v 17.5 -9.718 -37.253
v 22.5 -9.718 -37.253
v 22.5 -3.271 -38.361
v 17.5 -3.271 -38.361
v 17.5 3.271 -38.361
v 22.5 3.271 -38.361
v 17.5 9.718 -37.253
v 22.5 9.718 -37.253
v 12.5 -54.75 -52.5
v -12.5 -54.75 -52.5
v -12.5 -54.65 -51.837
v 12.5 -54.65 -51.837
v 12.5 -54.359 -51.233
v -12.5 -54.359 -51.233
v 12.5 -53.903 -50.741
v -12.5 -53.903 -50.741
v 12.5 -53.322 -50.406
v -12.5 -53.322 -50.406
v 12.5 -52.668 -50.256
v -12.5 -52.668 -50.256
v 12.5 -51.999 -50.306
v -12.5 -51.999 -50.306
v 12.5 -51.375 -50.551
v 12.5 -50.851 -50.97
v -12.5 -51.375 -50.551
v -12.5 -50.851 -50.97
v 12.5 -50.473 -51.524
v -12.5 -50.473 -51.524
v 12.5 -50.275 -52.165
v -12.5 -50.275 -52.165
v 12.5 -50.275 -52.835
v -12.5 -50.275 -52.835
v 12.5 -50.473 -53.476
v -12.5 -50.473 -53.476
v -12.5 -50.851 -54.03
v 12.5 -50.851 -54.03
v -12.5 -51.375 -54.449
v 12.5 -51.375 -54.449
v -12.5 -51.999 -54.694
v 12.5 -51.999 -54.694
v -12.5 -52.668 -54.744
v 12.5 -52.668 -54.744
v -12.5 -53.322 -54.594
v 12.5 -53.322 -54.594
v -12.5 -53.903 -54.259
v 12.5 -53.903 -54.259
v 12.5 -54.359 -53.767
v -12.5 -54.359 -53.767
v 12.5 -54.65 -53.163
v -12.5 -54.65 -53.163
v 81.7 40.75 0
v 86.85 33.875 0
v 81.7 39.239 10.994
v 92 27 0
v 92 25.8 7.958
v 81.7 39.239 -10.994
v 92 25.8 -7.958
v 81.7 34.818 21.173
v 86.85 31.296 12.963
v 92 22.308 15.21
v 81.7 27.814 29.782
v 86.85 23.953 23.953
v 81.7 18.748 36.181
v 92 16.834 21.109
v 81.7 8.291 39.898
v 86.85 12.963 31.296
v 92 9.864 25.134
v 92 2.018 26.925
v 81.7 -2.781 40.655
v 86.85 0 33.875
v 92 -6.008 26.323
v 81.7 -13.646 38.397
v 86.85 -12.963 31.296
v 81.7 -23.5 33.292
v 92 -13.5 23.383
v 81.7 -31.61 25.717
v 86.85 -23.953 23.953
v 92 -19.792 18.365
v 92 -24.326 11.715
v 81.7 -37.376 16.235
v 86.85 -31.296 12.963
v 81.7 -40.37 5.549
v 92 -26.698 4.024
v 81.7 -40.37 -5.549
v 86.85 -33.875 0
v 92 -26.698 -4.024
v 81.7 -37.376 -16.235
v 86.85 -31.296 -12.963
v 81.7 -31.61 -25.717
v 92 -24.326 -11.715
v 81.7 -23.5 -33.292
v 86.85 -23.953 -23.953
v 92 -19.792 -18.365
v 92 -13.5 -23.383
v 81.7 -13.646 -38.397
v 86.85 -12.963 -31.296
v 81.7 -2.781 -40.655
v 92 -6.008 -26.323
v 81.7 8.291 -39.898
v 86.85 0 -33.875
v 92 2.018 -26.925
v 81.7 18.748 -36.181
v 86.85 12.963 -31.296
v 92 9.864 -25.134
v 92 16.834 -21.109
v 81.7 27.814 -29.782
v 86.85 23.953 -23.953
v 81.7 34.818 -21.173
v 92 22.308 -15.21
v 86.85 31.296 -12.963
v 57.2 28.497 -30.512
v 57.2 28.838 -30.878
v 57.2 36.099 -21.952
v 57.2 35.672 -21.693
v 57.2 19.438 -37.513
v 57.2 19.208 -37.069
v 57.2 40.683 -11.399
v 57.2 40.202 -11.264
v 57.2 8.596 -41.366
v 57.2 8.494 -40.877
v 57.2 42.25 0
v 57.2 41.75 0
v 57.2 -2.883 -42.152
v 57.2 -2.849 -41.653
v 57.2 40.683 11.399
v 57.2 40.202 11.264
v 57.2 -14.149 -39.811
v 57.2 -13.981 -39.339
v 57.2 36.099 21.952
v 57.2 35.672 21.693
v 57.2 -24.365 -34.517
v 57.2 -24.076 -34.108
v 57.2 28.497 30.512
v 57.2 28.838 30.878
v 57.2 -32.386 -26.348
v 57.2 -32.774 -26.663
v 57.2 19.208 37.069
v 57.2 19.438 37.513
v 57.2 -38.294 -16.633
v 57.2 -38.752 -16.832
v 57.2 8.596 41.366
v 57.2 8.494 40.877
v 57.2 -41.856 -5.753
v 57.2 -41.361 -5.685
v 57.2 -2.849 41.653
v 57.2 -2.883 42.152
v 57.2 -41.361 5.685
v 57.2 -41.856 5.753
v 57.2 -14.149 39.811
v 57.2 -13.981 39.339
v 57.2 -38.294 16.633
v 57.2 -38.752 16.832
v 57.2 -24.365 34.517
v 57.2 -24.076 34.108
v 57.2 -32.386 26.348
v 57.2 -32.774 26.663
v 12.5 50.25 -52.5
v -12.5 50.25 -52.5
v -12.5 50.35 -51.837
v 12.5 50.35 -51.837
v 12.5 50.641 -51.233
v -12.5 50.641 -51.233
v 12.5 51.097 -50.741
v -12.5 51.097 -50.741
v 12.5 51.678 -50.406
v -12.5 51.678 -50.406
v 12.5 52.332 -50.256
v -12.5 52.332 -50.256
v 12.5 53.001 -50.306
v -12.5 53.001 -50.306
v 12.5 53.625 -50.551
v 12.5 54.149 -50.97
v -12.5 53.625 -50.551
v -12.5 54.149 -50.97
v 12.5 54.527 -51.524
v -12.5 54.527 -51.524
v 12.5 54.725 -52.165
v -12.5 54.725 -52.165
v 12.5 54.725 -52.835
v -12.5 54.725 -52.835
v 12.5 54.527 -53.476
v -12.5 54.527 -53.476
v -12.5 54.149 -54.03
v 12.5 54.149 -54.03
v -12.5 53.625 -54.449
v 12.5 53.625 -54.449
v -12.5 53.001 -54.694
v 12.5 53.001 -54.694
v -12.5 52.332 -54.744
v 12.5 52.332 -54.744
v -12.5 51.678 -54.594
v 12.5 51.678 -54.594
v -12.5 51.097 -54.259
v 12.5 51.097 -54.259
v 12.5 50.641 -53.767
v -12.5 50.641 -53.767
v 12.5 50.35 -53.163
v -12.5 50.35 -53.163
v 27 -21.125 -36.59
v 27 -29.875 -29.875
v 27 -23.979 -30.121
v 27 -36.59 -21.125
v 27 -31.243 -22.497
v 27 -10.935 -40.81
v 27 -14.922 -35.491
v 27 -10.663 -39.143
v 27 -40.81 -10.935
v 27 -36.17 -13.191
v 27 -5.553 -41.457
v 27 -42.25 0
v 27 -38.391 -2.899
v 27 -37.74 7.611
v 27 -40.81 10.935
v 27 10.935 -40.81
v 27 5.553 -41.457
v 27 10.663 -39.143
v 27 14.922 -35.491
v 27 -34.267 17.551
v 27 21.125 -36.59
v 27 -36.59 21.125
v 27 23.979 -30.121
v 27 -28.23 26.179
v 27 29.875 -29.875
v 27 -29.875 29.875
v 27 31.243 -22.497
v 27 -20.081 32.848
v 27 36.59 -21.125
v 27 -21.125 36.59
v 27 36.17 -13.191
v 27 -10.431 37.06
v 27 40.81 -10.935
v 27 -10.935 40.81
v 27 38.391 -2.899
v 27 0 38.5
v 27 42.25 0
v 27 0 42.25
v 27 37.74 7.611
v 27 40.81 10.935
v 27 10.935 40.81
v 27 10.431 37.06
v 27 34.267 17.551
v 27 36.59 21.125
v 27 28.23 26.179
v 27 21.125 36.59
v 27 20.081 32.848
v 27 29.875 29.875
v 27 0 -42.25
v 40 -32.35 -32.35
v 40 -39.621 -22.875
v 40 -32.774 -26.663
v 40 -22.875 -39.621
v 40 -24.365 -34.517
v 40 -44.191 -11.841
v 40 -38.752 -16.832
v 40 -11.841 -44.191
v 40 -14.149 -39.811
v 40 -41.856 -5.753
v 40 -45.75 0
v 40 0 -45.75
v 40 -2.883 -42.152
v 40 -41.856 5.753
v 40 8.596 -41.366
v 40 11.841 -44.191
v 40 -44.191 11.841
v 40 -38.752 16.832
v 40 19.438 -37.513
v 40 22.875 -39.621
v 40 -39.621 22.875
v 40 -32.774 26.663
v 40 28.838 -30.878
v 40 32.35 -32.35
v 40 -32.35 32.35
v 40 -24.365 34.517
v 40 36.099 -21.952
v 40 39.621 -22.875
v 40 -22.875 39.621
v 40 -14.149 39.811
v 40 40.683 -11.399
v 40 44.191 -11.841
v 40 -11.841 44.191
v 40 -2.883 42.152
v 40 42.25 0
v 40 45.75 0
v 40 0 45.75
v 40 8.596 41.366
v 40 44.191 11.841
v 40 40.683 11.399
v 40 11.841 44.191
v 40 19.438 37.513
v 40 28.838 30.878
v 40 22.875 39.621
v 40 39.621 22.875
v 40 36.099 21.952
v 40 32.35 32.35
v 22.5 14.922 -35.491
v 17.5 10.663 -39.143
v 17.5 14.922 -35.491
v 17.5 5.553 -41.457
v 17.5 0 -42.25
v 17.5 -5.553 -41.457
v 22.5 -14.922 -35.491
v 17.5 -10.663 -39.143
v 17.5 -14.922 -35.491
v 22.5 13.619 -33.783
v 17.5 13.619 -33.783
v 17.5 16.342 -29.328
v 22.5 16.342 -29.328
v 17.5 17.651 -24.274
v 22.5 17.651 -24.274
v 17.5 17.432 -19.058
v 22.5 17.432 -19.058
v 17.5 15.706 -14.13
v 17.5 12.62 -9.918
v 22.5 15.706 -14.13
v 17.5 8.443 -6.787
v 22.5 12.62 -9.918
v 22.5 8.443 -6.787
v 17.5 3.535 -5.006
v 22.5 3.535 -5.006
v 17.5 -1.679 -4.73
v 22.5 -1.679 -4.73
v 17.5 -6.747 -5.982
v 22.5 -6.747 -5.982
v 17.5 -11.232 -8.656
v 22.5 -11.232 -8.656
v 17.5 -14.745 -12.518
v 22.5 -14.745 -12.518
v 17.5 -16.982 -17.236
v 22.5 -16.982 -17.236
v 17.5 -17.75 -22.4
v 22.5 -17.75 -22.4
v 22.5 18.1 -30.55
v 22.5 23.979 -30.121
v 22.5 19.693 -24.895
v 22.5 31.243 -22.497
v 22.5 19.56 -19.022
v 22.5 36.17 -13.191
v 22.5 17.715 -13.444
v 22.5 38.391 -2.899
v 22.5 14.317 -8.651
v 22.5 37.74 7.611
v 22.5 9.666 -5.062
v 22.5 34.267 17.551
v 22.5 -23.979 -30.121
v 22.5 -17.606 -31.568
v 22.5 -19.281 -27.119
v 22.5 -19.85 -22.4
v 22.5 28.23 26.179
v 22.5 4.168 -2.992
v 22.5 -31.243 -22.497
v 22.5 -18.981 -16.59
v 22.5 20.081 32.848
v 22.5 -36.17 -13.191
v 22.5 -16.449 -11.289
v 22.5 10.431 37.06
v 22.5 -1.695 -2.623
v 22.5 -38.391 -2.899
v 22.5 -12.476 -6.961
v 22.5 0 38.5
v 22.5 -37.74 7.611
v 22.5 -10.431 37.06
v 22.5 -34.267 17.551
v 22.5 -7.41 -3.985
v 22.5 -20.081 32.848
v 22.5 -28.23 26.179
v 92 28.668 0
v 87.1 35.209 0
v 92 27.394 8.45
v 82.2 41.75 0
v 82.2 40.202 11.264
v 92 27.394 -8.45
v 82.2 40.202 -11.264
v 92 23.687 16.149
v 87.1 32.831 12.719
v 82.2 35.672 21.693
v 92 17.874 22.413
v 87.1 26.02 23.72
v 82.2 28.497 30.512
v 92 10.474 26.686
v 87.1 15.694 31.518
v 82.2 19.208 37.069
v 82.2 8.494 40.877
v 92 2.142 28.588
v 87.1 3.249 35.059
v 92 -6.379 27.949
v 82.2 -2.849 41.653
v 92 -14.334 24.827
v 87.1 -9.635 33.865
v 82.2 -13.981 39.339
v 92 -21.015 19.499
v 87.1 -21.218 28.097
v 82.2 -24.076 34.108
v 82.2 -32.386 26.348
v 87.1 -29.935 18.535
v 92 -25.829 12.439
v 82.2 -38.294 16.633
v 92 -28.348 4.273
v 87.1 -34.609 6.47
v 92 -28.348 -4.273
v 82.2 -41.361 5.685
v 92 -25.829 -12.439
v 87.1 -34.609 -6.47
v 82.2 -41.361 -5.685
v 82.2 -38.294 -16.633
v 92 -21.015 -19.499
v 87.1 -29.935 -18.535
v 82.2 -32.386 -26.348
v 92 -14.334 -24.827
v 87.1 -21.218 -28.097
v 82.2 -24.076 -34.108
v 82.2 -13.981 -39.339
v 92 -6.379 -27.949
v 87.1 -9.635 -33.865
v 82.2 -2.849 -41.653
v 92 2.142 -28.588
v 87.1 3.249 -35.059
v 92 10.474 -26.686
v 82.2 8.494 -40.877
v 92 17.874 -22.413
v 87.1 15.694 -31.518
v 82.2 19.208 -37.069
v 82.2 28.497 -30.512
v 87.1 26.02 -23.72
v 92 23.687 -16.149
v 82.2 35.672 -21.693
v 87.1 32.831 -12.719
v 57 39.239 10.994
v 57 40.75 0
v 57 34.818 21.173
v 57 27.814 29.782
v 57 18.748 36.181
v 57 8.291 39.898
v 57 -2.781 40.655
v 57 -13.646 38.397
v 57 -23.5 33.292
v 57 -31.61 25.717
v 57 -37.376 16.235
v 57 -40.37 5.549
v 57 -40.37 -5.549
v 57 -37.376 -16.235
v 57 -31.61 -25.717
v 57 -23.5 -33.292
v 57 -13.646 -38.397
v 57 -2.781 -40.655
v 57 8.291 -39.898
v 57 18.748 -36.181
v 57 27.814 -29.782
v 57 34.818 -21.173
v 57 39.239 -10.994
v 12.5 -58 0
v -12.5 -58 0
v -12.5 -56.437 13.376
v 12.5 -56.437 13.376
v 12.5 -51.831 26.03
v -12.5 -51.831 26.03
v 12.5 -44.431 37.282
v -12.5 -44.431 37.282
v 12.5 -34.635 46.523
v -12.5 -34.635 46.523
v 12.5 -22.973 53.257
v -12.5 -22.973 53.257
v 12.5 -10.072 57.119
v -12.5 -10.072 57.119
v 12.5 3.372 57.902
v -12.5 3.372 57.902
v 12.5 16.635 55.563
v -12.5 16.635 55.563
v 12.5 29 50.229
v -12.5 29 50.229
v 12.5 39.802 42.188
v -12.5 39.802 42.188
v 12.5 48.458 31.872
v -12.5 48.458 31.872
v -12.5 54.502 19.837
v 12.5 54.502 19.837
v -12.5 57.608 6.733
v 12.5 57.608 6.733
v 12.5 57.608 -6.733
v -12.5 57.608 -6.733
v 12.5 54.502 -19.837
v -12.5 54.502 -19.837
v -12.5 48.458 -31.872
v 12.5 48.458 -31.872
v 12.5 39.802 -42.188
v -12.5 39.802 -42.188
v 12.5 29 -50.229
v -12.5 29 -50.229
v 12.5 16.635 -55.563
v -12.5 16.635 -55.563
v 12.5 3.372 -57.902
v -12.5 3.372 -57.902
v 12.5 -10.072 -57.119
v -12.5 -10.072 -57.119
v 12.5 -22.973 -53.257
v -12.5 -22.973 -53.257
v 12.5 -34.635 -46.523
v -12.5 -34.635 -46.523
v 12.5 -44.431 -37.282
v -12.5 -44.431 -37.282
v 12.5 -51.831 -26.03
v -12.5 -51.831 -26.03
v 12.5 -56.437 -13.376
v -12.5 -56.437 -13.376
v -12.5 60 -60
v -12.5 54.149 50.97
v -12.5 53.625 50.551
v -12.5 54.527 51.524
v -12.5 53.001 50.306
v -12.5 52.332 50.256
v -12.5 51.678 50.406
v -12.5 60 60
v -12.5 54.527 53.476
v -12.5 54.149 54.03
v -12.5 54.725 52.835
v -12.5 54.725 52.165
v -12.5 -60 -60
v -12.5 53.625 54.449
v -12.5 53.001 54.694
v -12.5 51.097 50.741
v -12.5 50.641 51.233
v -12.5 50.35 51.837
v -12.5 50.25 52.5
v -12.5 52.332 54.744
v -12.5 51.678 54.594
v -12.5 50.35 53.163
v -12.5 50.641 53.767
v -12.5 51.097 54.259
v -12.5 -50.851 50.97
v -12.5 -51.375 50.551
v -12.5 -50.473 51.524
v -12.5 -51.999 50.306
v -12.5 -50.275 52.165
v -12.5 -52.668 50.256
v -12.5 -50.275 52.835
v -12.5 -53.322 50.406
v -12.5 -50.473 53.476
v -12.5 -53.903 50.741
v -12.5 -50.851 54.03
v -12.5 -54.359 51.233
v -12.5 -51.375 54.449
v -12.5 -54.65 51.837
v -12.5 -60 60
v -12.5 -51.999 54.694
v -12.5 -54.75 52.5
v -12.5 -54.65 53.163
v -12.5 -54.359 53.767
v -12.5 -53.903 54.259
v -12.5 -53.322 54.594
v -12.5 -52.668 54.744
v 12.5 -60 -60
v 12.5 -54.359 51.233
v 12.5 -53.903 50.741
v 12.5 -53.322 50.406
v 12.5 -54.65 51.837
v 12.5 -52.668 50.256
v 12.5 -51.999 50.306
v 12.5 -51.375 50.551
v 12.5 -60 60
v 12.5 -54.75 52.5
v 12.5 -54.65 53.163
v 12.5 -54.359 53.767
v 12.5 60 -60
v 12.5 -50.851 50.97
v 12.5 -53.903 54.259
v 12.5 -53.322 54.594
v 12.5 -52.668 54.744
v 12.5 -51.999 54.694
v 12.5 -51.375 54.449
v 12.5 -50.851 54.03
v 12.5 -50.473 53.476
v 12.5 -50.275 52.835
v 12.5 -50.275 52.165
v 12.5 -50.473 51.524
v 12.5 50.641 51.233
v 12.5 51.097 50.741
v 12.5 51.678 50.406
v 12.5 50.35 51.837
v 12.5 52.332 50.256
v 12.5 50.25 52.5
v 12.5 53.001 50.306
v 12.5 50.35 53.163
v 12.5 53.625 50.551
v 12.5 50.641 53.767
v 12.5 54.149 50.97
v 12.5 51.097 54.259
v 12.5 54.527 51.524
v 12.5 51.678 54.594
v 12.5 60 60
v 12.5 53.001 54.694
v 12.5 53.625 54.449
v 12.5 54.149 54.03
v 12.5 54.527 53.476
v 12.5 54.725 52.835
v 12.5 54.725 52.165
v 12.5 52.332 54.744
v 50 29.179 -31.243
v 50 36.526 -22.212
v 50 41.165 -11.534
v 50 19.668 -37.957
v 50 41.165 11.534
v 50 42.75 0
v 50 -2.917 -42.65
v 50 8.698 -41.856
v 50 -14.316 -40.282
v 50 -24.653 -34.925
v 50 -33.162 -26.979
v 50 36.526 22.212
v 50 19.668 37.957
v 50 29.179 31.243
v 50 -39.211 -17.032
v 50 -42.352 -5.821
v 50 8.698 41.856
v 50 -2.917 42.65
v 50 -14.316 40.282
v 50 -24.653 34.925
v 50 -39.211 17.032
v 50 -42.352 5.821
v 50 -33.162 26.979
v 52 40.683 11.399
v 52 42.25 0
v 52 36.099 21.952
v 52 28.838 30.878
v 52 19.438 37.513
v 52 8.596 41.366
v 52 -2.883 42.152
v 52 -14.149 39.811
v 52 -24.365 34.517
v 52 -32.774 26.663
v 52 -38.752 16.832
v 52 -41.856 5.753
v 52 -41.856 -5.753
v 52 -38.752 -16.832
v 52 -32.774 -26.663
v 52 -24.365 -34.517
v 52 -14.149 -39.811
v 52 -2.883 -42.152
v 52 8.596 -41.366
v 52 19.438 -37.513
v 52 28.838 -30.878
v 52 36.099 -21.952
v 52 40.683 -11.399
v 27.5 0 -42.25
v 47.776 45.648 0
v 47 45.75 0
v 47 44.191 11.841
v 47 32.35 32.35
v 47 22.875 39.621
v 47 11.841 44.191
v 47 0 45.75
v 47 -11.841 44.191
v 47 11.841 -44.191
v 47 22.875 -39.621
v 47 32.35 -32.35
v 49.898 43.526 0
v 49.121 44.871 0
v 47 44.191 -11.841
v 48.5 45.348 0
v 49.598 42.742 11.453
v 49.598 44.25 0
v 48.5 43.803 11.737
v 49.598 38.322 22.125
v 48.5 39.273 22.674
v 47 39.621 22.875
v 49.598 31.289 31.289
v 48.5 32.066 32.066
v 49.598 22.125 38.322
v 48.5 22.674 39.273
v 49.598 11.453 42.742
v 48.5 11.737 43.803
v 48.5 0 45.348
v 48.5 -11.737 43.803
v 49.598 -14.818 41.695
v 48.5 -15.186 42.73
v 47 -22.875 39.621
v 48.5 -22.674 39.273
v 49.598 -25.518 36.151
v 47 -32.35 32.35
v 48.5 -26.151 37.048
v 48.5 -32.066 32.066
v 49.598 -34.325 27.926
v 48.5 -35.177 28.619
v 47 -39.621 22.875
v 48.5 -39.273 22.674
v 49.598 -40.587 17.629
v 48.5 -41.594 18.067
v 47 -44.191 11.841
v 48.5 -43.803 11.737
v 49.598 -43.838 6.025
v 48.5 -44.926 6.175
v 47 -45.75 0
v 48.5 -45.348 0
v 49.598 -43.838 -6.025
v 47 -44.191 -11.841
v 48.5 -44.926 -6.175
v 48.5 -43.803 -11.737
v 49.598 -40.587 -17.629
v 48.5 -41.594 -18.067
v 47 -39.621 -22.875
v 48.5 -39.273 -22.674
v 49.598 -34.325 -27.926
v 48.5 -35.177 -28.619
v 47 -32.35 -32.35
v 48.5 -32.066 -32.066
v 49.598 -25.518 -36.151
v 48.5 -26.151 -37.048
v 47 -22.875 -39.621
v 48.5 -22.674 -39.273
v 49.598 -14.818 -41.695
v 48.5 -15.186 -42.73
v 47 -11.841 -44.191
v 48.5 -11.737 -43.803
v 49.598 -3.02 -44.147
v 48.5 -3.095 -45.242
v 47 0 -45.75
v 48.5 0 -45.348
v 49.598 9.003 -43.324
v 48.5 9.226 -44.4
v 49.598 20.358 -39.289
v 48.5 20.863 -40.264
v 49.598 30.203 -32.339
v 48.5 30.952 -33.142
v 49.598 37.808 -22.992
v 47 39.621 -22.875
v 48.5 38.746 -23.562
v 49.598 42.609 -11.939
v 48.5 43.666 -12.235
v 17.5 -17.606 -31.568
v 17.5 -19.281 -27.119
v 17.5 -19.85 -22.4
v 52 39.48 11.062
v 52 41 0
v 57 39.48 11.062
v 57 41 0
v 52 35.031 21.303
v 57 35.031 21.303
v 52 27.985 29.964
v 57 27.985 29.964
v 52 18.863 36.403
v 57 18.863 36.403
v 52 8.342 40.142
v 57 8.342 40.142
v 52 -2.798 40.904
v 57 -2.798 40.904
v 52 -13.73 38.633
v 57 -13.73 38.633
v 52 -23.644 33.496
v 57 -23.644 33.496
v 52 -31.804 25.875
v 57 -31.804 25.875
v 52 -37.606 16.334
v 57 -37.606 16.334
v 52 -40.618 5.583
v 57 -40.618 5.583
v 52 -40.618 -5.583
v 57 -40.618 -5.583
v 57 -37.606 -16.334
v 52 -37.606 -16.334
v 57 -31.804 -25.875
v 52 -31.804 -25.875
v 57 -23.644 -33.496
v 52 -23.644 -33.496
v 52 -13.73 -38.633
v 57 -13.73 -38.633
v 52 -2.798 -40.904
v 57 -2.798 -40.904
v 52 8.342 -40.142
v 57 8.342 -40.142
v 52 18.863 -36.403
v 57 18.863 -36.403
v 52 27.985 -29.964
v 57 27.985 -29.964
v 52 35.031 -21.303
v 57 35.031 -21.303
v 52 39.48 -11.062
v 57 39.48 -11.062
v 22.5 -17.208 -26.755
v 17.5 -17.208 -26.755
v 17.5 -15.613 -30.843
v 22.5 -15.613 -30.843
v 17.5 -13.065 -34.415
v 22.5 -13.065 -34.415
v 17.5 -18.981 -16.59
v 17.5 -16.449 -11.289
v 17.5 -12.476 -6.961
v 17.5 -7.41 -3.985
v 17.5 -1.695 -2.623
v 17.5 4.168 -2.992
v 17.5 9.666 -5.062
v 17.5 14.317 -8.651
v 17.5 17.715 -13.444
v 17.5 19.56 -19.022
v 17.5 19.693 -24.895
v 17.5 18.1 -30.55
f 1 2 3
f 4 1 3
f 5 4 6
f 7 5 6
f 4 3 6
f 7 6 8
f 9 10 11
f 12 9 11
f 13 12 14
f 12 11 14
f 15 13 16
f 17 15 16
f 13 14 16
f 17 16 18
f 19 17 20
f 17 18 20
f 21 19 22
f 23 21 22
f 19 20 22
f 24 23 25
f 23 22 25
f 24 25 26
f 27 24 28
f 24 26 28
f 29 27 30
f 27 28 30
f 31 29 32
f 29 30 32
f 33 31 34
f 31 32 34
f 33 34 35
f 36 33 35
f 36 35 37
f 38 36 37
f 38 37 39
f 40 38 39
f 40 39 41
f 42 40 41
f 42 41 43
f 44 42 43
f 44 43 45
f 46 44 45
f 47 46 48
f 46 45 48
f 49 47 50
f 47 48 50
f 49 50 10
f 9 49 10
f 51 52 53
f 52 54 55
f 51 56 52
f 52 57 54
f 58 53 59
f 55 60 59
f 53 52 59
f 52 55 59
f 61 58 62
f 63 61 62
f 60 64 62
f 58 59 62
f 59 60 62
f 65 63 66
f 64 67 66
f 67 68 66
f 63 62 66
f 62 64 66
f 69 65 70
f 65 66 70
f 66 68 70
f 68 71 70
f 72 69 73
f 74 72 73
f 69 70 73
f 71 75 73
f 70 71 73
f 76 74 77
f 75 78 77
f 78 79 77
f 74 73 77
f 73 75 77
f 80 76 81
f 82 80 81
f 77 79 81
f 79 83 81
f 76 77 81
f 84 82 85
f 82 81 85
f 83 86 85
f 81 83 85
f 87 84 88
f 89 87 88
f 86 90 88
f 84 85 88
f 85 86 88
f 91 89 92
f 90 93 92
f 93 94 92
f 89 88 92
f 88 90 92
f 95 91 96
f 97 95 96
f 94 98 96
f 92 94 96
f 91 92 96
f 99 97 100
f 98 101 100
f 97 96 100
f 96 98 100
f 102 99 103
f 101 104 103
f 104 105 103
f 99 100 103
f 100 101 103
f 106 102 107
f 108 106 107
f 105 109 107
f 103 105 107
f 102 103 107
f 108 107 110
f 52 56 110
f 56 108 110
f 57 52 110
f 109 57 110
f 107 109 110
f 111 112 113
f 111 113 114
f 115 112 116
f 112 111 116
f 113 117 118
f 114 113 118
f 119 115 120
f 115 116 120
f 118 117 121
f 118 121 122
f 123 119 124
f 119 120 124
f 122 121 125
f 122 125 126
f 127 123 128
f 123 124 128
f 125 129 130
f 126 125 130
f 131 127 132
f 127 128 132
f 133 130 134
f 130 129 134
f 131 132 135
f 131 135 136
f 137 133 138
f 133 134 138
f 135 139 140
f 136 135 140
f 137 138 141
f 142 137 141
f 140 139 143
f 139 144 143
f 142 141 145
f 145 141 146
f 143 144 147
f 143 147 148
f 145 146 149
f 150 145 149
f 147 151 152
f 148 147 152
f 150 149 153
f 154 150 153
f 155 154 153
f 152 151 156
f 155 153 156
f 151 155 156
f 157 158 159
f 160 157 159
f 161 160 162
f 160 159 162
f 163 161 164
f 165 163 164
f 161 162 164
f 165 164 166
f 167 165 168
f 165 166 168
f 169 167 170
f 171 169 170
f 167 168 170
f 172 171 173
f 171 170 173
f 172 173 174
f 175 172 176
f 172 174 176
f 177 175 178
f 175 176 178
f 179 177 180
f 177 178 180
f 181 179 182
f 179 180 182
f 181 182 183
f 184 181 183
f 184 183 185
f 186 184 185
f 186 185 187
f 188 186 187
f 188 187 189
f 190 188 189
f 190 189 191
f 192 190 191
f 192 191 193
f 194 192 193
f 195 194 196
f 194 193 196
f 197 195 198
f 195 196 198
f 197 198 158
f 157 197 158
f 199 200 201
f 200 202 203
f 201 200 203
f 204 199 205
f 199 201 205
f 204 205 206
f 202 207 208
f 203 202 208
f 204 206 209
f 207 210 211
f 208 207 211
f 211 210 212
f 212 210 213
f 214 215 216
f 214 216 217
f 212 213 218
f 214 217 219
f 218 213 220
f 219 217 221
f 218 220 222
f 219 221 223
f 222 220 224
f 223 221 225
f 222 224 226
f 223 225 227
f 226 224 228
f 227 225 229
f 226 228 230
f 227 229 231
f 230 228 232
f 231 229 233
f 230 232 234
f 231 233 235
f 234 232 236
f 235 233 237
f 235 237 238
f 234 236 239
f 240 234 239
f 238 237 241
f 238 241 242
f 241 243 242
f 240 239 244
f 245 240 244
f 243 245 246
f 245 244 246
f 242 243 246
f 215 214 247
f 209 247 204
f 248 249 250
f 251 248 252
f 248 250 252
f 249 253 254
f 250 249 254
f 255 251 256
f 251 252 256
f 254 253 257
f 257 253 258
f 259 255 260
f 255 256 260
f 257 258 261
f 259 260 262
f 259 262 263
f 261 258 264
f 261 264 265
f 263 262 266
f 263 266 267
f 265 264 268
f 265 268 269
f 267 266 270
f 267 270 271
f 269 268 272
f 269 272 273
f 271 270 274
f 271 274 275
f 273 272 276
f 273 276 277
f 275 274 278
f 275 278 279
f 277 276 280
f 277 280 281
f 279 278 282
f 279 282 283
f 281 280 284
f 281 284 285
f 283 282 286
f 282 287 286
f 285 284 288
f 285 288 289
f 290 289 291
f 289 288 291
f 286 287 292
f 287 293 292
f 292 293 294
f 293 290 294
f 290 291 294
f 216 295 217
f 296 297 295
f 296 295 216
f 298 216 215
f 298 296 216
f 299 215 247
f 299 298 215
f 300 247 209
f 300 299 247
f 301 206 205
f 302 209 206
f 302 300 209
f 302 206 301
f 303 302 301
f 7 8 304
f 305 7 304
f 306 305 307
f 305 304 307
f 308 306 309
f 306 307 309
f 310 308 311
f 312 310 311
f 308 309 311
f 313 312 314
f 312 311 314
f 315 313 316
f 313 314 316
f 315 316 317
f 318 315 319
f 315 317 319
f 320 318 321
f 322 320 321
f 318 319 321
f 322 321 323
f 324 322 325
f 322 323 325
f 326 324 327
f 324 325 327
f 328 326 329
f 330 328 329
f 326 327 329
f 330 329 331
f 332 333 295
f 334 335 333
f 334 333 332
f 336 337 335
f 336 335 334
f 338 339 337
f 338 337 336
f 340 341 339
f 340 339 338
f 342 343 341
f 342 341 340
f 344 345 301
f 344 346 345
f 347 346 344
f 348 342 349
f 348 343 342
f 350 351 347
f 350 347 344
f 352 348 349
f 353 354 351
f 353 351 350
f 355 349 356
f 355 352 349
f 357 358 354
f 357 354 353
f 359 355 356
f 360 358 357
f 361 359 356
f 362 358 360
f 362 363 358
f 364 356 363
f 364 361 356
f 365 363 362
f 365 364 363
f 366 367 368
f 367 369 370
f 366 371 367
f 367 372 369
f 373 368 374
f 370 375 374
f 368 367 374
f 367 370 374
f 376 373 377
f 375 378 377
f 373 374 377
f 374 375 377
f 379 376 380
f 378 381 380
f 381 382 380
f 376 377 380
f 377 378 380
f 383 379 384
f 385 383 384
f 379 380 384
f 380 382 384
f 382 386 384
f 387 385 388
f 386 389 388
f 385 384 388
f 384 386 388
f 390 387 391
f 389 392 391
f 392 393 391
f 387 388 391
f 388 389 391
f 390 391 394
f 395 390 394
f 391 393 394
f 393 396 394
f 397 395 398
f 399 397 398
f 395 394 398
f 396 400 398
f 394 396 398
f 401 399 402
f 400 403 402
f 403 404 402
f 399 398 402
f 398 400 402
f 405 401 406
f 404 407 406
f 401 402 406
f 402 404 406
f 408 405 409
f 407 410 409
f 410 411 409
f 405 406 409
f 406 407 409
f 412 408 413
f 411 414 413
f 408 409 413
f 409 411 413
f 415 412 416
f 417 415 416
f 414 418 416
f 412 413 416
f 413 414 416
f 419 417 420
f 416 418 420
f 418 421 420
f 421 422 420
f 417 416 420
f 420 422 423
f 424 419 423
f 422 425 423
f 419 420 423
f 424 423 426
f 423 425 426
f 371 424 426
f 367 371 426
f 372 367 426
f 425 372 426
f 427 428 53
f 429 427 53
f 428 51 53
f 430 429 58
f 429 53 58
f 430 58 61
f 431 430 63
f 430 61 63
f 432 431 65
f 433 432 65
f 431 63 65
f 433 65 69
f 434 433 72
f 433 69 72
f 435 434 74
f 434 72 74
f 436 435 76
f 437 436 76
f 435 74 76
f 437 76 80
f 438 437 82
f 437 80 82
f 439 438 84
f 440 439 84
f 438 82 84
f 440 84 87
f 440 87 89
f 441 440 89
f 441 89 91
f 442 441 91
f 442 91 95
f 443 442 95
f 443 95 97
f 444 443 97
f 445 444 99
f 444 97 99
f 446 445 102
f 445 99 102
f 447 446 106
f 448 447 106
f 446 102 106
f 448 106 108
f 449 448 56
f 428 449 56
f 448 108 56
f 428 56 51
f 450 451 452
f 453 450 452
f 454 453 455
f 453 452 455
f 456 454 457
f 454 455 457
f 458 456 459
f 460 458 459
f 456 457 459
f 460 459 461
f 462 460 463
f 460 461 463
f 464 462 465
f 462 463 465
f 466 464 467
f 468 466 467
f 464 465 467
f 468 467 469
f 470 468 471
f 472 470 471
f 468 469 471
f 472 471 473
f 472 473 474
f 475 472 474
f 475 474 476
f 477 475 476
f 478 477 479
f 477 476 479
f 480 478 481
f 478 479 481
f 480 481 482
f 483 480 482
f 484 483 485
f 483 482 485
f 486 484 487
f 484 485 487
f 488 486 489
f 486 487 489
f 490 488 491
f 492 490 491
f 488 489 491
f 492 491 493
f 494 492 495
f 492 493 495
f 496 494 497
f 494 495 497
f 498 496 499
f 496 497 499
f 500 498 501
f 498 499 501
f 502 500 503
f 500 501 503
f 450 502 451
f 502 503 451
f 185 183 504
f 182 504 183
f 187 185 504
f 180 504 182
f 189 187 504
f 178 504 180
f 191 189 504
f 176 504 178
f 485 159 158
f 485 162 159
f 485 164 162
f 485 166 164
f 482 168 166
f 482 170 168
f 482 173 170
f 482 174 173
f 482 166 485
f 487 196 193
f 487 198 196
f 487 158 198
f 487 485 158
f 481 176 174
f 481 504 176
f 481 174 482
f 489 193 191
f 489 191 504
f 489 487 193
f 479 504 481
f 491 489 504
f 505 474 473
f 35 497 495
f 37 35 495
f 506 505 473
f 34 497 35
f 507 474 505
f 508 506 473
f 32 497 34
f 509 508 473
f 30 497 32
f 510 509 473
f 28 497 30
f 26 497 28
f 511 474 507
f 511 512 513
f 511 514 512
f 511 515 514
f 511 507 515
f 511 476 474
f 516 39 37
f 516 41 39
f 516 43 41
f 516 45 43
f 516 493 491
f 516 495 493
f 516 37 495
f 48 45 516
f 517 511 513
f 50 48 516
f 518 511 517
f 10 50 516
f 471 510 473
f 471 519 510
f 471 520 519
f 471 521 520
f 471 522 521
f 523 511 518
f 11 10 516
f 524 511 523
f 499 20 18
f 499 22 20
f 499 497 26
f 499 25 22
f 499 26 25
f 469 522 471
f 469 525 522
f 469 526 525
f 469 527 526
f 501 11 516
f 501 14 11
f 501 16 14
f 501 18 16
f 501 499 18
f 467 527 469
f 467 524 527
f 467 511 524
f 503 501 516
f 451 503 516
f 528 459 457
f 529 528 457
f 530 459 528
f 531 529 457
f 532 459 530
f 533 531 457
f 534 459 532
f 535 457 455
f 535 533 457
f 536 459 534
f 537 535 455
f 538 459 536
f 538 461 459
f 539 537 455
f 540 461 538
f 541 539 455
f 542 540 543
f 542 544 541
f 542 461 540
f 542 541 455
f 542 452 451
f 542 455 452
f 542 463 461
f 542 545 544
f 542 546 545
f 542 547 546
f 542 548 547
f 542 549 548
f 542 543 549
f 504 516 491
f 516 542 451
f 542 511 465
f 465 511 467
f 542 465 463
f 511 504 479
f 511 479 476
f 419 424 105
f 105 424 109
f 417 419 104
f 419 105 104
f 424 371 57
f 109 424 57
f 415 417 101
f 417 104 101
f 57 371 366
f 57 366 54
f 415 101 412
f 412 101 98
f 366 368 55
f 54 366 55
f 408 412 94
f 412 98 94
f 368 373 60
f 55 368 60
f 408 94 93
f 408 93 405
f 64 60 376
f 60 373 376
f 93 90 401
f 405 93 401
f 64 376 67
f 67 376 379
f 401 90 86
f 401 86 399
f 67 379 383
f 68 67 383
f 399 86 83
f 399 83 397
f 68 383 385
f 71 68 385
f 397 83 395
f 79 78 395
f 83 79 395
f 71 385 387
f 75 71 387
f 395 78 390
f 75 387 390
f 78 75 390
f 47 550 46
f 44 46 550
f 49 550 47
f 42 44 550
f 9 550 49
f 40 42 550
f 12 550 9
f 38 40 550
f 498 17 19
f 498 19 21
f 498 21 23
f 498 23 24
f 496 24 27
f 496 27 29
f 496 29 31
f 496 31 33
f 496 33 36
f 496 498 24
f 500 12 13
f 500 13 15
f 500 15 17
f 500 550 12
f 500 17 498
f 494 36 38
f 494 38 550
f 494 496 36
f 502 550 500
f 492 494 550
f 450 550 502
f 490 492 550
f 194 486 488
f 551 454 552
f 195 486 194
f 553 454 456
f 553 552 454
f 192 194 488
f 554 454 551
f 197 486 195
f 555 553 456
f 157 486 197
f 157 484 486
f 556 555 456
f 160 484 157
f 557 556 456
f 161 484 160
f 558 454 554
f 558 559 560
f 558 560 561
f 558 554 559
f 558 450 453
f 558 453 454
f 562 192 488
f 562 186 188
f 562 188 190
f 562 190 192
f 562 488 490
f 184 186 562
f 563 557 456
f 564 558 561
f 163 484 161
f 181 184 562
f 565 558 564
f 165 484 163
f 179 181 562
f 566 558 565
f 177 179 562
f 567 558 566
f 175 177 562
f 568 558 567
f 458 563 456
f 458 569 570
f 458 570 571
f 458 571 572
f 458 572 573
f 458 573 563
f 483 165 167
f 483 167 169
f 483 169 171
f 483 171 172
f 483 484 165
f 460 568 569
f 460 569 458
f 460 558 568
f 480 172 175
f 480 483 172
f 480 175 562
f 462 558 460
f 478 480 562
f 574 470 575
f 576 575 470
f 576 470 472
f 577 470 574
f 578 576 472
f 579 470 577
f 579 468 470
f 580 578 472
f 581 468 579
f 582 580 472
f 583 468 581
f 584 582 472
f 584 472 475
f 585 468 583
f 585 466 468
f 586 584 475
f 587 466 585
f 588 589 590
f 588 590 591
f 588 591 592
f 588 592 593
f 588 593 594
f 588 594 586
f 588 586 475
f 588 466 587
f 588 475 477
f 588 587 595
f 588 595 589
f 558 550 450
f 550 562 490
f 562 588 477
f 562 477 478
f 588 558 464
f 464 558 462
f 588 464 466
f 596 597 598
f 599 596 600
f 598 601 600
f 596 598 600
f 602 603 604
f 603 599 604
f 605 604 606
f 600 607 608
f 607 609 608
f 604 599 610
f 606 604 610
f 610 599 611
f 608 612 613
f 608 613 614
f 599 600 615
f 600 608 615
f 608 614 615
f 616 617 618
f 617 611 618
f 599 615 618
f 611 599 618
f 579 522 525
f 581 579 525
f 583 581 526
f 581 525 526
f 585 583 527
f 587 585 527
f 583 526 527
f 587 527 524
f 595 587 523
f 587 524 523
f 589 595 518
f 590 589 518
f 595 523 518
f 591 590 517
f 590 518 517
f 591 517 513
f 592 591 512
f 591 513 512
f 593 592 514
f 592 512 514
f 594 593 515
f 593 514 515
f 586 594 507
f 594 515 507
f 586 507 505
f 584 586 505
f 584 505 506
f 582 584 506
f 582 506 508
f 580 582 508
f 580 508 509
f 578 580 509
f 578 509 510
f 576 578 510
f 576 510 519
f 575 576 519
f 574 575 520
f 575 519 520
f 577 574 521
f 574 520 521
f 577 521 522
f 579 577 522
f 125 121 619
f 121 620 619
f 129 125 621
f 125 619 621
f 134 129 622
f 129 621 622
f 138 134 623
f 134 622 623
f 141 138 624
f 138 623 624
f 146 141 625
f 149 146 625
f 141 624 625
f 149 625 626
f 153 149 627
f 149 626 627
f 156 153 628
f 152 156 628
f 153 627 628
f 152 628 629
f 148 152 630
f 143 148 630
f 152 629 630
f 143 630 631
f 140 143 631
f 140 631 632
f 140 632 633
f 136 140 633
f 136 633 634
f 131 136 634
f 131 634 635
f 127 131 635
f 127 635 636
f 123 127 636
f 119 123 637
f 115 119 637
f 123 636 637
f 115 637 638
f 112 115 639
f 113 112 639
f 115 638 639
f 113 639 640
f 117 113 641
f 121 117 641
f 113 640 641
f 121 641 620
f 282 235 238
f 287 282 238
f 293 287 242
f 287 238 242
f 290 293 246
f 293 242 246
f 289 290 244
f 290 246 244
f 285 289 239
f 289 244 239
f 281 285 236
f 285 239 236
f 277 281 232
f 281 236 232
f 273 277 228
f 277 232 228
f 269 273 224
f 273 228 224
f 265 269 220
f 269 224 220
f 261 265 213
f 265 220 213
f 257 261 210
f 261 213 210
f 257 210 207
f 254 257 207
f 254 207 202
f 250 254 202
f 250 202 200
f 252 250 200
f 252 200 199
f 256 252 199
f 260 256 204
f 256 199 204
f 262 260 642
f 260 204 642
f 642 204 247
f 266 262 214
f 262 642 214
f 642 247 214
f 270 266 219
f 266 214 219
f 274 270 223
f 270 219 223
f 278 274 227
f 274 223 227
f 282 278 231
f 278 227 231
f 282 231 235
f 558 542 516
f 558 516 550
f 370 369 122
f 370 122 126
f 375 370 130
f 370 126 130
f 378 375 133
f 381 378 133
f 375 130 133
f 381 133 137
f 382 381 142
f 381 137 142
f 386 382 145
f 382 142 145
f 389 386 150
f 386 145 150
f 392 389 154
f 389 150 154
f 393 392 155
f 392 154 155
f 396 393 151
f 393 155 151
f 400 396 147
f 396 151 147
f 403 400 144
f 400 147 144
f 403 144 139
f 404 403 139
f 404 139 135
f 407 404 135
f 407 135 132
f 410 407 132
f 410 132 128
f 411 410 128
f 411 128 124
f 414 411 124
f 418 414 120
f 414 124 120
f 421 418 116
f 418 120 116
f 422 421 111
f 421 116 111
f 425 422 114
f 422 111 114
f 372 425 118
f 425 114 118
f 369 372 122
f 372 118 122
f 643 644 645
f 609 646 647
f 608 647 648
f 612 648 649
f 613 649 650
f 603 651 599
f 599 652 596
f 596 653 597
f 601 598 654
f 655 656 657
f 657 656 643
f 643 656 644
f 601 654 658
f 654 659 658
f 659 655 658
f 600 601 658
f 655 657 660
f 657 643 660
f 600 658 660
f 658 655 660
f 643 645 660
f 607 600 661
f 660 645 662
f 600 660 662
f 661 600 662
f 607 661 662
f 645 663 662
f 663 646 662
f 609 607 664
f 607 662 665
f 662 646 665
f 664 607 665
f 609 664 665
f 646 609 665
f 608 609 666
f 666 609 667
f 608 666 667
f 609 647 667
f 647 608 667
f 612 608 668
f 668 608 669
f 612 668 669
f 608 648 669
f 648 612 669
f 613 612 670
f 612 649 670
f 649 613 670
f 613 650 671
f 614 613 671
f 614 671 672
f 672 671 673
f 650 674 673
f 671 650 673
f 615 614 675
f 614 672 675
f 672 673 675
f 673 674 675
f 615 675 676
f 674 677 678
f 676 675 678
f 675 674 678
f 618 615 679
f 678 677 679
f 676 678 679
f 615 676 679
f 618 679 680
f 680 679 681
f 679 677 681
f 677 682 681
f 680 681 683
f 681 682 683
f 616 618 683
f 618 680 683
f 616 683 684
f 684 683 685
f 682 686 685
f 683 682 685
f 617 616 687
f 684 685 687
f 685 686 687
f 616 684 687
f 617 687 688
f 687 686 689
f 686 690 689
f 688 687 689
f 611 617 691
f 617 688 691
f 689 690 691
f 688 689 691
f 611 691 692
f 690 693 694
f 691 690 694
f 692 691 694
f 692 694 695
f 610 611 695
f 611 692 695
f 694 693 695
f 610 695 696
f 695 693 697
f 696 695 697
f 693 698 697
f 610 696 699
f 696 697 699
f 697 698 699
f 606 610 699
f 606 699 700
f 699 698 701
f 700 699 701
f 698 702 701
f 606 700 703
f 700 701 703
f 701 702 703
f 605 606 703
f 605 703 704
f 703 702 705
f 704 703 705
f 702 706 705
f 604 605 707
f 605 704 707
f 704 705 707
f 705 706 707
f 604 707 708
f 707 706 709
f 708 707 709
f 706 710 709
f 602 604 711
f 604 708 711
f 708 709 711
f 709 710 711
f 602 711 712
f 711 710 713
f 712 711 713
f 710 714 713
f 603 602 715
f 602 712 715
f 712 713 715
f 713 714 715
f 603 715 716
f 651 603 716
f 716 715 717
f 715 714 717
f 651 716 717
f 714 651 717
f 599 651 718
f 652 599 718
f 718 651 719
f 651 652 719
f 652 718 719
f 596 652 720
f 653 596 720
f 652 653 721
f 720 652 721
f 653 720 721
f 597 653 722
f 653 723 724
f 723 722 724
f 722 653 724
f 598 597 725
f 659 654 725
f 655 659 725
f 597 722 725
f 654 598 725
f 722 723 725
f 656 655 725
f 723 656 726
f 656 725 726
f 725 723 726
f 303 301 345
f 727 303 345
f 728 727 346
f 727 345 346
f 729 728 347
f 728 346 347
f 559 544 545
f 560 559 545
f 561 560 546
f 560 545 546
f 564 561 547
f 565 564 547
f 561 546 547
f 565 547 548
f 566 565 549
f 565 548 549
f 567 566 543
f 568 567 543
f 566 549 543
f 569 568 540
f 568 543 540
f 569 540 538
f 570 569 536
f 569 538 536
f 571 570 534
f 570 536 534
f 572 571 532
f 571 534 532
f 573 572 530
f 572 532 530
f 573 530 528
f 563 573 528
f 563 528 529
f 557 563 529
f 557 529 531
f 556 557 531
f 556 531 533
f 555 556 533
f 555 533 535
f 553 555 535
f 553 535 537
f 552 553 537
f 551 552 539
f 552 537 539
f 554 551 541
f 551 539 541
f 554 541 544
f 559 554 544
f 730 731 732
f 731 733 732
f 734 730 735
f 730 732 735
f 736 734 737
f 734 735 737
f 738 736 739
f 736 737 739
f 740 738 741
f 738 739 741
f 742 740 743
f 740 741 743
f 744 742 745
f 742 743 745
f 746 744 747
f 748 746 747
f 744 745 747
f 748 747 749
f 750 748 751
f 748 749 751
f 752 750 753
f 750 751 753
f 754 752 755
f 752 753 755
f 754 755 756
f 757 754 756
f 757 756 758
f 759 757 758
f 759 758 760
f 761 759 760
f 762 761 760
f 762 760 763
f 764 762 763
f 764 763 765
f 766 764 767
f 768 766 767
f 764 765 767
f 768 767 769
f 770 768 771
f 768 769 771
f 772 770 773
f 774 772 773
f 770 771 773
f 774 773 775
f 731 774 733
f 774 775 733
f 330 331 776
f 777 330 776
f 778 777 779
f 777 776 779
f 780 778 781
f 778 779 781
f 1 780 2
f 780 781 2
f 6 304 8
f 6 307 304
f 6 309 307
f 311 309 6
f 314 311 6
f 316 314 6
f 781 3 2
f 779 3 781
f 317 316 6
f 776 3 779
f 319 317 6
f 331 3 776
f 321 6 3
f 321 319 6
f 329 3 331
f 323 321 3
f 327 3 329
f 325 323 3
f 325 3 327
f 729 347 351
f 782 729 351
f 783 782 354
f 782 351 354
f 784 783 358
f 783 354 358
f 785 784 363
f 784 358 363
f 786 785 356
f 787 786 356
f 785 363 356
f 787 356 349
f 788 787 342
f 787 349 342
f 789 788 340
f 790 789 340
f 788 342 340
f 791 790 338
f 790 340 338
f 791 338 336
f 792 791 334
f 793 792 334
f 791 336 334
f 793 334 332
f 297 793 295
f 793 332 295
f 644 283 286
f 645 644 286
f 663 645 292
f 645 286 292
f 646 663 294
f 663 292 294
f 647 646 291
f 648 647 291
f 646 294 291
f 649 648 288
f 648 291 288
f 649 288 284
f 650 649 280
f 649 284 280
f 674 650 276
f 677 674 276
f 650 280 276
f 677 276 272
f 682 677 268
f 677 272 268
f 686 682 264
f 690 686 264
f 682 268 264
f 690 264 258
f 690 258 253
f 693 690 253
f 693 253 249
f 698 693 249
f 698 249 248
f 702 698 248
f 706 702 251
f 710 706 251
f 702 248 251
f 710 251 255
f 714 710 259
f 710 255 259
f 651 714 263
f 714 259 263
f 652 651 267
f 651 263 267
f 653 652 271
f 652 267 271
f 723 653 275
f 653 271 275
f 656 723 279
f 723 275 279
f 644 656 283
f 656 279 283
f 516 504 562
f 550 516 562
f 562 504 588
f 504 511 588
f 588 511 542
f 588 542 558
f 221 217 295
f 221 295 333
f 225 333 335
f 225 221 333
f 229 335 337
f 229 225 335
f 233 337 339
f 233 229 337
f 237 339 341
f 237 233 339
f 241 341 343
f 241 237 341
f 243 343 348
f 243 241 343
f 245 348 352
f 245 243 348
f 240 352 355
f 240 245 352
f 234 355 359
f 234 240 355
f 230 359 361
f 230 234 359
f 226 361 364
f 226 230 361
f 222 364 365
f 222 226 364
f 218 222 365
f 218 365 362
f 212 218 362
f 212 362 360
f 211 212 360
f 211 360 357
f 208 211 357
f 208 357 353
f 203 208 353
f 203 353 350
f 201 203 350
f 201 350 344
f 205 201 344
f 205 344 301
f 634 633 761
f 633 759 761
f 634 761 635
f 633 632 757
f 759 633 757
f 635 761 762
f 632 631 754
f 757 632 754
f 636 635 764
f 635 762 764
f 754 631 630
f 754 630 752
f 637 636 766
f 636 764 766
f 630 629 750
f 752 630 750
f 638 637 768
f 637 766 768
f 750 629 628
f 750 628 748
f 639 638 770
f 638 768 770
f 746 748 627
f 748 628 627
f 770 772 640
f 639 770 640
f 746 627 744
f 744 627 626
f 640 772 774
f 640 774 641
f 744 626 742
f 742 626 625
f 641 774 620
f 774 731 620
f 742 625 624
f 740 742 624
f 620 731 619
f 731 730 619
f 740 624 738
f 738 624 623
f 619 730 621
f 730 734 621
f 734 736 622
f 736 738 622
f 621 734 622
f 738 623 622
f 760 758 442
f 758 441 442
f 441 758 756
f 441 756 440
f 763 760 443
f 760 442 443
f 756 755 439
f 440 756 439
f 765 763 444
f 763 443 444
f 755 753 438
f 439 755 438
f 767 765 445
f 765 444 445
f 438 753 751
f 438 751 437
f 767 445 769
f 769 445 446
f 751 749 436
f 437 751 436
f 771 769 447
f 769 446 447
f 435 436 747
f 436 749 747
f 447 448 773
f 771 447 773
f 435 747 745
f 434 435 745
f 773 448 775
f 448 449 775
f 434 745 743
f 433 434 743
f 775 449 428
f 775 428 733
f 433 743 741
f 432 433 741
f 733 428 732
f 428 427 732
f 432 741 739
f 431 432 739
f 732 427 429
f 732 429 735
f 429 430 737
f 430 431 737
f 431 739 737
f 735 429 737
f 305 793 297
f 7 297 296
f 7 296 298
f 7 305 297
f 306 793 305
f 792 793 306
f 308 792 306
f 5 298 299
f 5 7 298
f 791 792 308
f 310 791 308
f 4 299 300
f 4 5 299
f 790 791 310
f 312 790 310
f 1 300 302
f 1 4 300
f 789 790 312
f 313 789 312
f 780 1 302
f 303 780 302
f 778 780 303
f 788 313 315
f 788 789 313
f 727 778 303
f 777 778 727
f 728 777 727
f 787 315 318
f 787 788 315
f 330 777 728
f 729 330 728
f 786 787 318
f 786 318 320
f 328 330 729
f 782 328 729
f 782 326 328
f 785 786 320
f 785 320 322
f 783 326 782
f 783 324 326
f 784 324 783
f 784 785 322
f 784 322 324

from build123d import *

# Parameters (mm, degrees)
F0_W          = 25
F0_H          = 60
F1_DEPTH      = 60
F0_W_2        = 4.5
F0_H_2        = 38.5
F3_R          = 3
F4_R          = 58
F4_R_2        = 2.25
F5_DEPTH      = 25
F7_DEPTH      = 5
F7_DEPTH_BACK = 5


with BuildPart() as f1:
    # F0 (on Top) → F1 (new body, symmetric)
    with BuildSketch(Plane.XY):
        with Locations((0, 30)):
            Rectangle(F0_W, F0_H)
        with Locations((0, -30)):
            Rectangle(F0_W, F0_H)
    extrude(amount=F1_DEPTH, both=True)

    # F4 (on face) → F5 (cut)
    with BuildSketch(Plane(origin=(-12.5, 0, 0), x_dir=(0, -1, 0), z_dir=(-1, 0, 0))):
        Circle(F4_R)
        with Locations((-52.5, 52.5)):
            Circle(F4_R_2)
        with Locations((-52.5, -52.5)):
            Circle(F4_R_2)
        with Locations((52.5, -52.5)):
            Circle(F4_R_2)
        with Locations((52.5, 52.5)):
            Circle(F4_R_2)
    extrude(amount=-F5_DEPTH, mode=Mode.SUBTRACT)


with BuildPart() as f2:
    # F0 (on Top) → F2 (revolve)
    with BuildSketch(Plane.XY):
        with Locations((24.75, 19.25)):
            Rectangle(F0_W_2, F0_H_2)
        Polygon((27, 38.5), (27, 0), (40, 0), (40, 42.25), (27, 42.25), align=None)
        Polygon((40, 42.25), (40, 0), (50, 0), (50, 45.75), (40, 45.75), align=None)
        Polygon((52, 42.25), (52, 41), (57, 41), (57, 40.75), (81.699646, 40.75), (92, 27), (92, 28.667925), (82.2, 41.75), (57.2, 41.75), (57.2, 42.25), align=None)
    revolve(axis=Axis((21.535583, 0, 0), (1, 0, 0)))

    # F3
    f3_edges = [f2.edges().sort_by_distance(p)[0] for p in [
        (50, -45.75, 0),
    ]]
    fillet(f3_edges, radius=F3_R)

    # F6 (on face) → F7 (join, two sides)
    with BuildSketch(Plane(origin=(22.5, 0, 0), x_dir=(0, -1, 0), z_dir=(-1, 0, 0))) as f7_sk:
        with BuildLine():
            ThreePointArc((-9.718138, -37.253292), (-12.351339, -36.464975), (-14.921583, -35.490792))
            ThreePointArc((-14.921583, -35.490792), (0, -42.25), (14.921583, -35.490792))
            ThreePointArc((14.921583, -35.490792), (12.351339, -36.464975), (9.718138, -37.253292))
            ThreePointArc((9.718138, -37.253292), (0, -40.15), (-9.718138, -37.253292))
        make_face()
        with BuildLine():
            ThreePointArc((14.921583, -35.490792), (18.577082, -29.393893), (19.85, -22.4))
            ThreePointArc((19.85, -22.4), (-6.993893, -3.822918), (-14.921583, -35.490792))
            ThreePointArc((-14.921583, -35.490792), (-12.351339, -36.464975), (-9.718138, -37.253292))
            ThreePointArc((-9.718138, -37.253292), (-8.442913, -6.786553), (17.75, -22.4))
            ThreePointArc((17.75, -22.4), (15.613447, -30.842913), (9.718138, -37.253292))
            ThreePointArc((9.718138, -37.253292), (12.351339, -36.464975), (14.921583, -35.490792))
        make_face()
        with BuildLine():
            ThreePointArc((9.718138, -37.253292), (0, -38.5), (-9.718138, -37.253292))
            ThreePointArc((-9.718138, -37.253292), (0, -40.15), (9.718138, -37.253292))
        make_face()
    extrude(amount=F7_DEPTH)
    extrude(f7_sk.sketch, amount=-F7_DEPTH_BACK)


solid = Compound([f1.part, f2.part])
